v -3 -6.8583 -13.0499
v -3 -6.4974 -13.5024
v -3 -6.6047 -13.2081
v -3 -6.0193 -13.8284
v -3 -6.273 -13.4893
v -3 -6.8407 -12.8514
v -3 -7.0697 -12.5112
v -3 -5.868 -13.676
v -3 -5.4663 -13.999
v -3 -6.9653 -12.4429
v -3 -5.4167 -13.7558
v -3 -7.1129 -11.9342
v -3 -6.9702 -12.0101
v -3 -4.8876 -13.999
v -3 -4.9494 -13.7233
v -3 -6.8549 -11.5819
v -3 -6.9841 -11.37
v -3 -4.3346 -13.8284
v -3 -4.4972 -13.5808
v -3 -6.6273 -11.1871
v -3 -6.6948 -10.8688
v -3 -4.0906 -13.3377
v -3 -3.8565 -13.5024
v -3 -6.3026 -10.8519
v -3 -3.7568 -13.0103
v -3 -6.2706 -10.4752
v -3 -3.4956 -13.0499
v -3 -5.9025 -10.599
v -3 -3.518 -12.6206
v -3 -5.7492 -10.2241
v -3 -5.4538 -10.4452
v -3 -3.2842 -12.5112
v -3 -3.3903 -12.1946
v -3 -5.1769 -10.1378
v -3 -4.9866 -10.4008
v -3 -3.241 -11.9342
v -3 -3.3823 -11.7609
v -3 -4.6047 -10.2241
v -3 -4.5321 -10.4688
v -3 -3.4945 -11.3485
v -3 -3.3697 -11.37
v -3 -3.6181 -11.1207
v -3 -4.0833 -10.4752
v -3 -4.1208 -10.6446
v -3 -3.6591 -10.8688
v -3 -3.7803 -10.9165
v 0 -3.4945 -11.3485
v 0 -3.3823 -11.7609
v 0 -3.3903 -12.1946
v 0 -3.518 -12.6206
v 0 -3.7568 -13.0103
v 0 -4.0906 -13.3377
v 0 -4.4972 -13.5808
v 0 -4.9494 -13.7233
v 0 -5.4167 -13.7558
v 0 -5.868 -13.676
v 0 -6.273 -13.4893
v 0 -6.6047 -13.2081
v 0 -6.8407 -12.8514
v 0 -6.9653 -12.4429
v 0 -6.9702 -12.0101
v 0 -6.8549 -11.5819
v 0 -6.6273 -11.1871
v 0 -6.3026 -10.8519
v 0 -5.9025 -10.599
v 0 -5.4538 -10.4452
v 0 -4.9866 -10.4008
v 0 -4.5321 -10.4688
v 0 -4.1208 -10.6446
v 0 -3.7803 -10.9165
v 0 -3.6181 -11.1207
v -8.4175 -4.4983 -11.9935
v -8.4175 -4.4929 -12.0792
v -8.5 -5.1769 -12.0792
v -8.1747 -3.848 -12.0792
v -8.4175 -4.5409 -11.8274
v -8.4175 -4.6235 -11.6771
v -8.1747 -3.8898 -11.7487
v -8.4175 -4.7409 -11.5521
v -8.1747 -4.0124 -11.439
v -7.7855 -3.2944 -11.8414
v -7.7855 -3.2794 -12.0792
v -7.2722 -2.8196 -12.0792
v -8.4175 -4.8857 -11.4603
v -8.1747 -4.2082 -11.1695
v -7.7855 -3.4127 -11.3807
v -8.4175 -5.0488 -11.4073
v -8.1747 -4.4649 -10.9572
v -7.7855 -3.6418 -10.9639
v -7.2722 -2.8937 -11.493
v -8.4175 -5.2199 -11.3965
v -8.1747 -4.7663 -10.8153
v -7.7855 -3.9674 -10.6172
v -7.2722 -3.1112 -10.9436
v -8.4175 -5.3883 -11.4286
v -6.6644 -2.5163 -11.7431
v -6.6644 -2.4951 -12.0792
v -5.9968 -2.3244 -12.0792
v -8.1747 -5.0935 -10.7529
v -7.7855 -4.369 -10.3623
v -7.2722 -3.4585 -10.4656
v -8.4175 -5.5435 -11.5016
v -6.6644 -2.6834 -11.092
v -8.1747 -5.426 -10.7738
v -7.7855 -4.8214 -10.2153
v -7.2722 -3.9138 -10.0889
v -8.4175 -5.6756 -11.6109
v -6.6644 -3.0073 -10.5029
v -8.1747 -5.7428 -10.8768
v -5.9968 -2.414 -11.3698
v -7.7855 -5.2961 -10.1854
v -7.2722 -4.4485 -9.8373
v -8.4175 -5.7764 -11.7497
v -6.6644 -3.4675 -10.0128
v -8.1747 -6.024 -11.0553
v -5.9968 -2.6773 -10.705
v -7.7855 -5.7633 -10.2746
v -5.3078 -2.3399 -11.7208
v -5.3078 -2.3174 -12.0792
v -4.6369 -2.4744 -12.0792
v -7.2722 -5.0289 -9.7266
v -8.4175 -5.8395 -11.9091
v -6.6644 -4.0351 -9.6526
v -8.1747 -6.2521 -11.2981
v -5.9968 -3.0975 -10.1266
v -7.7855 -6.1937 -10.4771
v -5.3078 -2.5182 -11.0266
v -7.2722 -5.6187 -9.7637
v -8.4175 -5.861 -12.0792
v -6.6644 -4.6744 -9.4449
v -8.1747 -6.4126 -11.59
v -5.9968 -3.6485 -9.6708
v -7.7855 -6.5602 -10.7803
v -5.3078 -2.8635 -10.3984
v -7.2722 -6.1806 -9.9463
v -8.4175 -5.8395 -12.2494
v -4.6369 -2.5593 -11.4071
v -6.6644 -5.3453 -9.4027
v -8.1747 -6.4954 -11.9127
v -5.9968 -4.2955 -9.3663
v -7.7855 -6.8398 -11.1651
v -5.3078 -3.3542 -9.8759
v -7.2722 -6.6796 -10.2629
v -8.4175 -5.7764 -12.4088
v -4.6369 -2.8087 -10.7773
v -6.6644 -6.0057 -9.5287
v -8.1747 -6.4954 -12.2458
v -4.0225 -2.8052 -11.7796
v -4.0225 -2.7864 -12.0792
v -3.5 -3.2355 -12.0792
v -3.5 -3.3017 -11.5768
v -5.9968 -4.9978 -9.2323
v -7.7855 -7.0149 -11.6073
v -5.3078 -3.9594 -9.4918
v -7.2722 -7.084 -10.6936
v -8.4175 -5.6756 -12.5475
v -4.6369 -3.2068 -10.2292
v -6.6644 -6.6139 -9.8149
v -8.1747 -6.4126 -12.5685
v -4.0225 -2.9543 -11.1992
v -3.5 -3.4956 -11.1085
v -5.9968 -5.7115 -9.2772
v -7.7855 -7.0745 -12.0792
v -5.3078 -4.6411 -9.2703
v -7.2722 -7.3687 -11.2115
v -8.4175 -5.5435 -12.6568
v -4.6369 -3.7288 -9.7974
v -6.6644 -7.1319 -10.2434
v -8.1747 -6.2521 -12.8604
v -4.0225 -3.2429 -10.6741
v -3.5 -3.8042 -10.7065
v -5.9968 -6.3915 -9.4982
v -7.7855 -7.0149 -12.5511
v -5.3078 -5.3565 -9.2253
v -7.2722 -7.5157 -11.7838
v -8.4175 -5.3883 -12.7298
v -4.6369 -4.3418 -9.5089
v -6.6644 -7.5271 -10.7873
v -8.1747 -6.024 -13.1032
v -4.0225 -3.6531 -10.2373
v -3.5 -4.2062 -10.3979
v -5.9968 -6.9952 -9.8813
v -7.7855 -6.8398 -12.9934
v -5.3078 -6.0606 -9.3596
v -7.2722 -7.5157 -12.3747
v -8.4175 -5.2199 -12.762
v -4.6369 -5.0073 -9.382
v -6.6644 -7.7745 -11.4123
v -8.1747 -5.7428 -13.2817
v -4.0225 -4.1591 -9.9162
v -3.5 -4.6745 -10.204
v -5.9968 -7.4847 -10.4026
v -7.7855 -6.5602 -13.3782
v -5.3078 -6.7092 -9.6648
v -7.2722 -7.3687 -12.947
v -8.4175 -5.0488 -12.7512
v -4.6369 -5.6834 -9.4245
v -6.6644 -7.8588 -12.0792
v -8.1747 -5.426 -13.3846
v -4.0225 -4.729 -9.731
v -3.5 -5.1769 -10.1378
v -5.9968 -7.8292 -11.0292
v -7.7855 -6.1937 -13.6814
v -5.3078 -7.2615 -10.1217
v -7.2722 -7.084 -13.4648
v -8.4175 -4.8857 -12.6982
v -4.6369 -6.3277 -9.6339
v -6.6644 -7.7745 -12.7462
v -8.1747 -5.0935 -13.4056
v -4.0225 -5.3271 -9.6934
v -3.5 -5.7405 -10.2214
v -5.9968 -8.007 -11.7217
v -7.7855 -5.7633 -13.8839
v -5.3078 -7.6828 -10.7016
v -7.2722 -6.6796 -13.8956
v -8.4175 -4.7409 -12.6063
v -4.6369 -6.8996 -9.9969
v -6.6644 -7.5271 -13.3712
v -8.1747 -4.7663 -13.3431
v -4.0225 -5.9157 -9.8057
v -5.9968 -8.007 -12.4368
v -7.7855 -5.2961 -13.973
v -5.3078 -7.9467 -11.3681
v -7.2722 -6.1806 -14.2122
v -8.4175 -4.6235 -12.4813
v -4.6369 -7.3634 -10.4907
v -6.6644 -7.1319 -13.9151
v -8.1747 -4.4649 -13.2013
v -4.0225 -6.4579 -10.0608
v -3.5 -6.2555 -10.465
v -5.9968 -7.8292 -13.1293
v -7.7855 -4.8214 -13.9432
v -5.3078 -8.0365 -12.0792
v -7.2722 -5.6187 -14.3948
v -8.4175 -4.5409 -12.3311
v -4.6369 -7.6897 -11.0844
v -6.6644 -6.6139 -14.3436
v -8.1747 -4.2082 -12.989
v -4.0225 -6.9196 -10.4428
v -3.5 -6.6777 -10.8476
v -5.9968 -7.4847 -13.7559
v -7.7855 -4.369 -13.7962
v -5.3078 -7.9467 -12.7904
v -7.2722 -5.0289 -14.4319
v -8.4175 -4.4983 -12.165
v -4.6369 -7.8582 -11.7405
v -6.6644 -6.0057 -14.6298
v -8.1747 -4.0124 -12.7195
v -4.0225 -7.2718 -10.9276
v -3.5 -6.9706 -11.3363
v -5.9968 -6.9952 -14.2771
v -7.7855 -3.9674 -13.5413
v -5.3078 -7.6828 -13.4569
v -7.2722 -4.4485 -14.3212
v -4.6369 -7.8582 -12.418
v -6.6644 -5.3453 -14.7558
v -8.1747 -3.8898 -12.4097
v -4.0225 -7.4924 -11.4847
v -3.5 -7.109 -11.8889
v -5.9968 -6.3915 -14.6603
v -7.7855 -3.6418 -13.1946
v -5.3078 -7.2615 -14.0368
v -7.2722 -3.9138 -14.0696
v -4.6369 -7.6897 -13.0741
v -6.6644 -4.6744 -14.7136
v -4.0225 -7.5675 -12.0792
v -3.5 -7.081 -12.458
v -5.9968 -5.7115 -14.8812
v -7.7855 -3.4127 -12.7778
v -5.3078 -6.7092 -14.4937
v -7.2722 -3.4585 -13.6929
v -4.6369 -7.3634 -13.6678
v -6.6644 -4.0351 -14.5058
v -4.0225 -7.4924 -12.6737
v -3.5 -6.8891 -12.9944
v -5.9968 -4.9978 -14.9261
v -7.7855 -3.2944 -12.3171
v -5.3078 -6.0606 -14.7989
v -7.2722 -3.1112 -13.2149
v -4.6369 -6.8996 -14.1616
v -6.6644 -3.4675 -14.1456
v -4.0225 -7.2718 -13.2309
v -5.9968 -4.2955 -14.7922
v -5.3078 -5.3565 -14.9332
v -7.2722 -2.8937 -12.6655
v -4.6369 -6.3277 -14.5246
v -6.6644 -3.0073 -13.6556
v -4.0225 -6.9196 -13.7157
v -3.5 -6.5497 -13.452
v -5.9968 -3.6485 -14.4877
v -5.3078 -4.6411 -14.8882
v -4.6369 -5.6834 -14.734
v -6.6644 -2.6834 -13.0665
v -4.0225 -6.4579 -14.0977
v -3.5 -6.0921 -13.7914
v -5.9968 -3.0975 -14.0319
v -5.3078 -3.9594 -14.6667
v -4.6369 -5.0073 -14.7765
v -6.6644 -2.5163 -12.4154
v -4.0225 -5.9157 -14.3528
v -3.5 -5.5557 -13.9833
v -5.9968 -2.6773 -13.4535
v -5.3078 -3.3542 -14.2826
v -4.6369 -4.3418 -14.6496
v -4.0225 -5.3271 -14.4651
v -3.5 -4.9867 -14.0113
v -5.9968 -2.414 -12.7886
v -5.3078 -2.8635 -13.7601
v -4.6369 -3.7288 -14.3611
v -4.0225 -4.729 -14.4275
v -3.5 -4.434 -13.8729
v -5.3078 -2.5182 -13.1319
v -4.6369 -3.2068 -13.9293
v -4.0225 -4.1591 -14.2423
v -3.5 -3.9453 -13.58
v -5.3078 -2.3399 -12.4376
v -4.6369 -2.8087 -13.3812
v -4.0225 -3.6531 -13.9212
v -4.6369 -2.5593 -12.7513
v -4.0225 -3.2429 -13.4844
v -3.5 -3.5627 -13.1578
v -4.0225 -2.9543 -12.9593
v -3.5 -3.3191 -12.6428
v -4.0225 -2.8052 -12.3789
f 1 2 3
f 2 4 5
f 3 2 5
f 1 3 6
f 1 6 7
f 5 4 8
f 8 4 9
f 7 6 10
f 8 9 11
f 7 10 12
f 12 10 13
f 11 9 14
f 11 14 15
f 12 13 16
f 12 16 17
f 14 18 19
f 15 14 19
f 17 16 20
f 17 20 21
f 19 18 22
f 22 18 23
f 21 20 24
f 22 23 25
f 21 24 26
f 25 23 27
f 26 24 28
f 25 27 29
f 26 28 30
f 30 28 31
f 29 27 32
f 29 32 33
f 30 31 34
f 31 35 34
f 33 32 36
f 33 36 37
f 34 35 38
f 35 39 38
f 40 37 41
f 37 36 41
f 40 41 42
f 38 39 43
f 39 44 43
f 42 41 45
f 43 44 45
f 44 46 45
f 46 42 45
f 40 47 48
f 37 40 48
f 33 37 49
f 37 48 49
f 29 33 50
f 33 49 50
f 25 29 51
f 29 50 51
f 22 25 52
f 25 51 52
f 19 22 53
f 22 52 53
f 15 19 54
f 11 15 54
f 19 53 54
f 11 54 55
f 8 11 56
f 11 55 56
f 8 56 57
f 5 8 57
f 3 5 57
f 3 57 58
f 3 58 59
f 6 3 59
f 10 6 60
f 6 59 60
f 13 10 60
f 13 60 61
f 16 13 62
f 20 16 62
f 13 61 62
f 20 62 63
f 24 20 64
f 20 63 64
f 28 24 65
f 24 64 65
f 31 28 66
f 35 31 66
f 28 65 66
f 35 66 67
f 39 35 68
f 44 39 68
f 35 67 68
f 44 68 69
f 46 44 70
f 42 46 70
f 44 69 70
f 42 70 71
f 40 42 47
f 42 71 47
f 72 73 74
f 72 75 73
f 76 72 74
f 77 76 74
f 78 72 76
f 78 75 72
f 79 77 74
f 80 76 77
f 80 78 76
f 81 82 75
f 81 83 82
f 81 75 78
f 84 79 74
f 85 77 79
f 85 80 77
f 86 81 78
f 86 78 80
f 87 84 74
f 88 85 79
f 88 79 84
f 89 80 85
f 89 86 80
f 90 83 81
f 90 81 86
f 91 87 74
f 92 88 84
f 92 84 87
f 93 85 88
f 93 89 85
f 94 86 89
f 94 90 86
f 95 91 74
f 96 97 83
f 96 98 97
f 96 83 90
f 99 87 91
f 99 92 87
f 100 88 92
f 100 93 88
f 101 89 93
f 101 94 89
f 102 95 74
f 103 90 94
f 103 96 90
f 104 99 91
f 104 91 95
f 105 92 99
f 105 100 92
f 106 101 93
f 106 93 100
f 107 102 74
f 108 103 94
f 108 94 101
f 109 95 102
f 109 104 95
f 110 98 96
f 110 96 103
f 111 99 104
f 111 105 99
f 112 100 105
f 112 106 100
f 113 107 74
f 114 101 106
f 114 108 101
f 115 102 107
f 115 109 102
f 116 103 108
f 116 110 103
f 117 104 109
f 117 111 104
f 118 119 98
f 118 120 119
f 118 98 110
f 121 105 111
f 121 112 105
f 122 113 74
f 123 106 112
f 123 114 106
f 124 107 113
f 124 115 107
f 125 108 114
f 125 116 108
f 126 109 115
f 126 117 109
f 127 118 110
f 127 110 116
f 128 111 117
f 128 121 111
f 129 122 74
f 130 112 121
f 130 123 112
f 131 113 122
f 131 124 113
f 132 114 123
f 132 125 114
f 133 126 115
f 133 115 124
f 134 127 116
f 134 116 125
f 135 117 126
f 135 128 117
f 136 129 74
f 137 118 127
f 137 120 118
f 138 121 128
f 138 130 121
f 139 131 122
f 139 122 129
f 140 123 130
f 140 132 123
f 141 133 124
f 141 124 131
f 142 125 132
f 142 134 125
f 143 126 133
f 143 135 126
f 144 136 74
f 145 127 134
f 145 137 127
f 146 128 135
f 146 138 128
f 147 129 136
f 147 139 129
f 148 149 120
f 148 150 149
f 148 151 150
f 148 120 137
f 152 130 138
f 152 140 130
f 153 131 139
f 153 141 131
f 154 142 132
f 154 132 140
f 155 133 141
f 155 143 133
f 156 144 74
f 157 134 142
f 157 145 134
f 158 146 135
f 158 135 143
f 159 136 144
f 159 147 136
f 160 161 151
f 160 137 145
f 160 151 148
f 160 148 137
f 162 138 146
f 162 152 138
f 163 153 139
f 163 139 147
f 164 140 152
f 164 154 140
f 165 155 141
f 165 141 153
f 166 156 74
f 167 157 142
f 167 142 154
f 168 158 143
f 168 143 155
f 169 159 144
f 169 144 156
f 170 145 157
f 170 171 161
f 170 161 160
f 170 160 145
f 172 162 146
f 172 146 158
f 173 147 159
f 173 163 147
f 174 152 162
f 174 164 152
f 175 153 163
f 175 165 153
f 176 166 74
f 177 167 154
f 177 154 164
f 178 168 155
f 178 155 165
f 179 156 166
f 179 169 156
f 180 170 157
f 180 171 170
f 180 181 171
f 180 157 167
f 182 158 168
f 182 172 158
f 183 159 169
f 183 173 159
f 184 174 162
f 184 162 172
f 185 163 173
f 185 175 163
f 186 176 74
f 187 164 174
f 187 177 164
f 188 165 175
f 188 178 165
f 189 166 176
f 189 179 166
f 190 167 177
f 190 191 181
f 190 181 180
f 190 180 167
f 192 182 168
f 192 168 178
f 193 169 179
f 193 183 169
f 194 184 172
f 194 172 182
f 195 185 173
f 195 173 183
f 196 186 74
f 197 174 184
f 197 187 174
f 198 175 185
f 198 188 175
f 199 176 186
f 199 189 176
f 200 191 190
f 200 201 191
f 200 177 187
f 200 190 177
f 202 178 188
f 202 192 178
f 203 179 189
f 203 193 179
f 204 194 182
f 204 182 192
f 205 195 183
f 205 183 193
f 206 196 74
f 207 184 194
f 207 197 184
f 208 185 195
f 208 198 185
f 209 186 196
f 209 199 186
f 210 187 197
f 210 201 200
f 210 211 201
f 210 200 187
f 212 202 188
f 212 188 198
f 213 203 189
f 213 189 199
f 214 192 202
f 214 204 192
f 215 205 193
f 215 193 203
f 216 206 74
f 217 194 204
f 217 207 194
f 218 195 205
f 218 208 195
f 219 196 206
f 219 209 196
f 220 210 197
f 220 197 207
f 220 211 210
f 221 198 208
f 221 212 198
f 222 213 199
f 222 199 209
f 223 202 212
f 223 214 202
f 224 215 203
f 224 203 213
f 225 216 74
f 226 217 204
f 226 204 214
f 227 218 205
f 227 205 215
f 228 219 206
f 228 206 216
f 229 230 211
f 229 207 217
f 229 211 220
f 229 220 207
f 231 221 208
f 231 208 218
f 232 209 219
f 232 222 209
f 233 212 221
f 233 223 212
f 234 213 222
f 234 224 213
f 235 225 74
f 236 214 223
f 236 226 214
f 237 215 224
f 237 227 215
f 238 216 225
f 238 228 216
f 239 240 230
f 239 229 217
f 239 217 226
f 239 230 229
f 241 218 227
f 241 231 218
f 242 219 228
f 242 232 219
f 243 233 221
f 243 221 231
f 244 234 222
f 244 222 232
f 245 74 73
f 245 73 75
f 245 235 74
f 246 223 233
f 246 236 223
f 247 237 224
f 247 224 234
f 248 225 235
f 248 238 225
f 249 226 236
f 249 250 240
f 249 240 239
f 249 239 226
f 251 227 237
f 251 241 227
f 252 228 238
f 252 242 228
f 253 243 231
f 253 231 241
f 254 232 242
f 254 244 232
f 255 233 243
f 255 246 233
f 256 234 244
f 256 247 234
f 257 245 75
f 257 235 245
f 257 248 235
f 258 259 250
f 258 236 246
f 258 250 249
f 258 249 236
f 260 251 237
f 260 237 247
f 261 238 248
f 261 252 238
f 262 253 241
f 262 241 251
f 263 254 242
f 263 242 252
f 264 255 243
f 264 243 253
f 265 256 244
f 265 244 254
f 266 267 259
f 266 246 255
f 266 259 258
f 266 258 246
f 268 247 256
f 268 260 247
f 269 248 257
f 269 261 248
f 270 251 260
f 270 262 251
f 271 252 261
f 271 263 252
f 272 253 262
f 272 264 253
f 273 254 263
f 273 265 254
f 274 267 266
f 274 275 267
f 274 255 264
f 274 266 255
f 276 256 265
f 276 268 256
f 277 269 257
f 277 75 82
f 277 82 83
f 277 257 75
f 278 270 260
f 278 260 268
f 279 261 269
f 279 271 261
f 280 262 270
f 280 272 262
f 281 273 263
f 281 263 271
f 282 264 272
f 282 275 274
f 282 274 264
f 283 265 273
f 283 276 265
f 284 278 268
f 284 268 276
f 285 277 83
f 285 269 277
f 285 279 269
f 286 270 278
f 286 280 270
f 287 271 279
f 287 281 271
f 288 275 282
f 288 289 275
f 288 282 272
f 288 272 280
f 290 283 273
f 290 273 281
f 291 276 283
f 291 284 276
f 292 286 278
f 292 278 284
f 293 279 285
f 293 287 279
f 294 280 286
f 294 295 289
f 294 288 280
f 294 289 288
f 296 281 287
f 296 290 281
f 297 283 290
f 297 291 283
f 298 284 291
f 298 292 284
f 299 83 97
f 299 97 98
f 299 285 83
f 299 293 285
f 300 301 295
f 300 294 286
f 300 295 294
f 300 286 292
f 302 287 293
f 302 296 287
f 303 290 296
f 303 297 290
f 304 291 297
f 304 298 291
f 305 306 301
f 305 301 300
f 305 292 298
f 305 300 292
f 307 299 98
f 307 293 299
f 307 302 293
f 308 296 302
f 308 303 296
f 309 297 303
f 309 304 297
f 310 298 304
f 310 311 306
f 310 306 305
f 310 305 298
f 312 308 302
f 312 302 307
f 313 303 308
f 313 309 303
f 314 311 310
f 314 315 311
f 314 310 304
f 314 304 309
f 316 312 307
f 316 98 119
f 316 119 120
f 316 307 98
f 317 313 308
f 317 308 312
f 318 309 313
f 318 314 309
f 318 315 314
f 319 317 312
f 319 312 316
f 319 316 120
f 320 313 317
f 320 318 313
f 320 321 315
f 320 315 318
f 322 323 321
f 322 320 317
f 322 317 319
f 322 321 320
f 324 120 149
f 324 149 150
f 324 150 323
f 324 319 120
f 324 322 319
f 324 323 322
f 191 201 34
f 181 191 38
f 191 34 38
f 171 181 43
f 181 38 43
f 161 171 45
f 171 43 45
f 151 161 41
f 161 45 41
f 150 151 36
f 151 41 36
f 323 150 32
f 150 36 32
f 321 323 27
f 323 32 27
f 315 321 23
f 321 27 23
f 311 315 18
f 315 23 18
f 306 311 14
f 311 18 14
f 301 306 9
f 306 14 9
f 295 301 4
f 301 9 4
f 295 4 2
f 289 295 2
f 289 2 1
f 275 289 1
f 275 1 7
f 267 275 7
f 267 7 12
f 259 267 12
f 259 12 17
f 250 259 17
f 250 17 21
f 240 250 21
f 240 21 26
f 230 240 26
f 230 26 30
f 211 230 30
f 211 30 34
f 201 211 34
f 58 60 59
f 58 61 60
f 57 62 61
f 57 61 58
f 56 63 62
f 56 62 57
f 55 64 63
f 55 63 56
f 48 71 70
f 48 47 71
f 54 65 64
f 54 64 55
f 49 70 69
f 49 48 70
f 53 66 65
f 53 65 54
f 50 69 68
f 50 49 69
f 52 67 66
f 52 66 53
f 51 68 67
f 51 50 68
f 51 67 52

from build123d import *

# Parameters (mm, degrees)
BOSS_EXTRUDE1_DEPTH = 4
CUT_EXTRUDE3_START  = -10
CUT_EXTRUDE3_DEPTH  = 10
CUT_EXTRUDE4_DEPTH  = 10
FILLET4_START       = -1
FILLET4_DEPTH       = 6
SKETCH7_RX          = 1.83432271
SKETCH7_RY          = 1.648181576
BOSS_EXTRUDE2_DEPTH = 3
SKETCH8_R           = 1.941403724
BOSS_EXTRUDE3_DEPTH = 0.5
CUT_EXTRUDE5_DEPTH  = 5
CUT_EXTRUDE6_DEPTH  = 10


with BuildPart() as part:
    # Sketch1 → Boss-Extrude1 (new body)
    with BuildSketch(Plane(origin=(0, 0, 0), x_dir=(0, 0, -1), z_dir=(1, 0, 0))):
        with BuildLine():
            Line((6.442518848, 0), (13.409619329, 0))
            ThreePointArc((13.409619329, 0), (16.945153235, -1.464466094), (18.409619329, -5))
            Line((18.409619329, -5), (18.409619329, -20.34540211))
            ThreePointArc((18.409619329, -20.34540211), (16.945153235, -23.880936016), (13.409619329, -25.34540211))
            Line((13.409619329, -25.34540211), (6.442518848, -25.34540211))
            ThreePointArc((6.442518848, -25.34540211), (2.906984942, -23.880936016), (1.442518848, -20.34540211))
            Line((1.442518848, -20.34540211), (1.442518848, -5))
            ThreePointArc((1.442518848, -5), (2.906984942, -1.464466094), (6.442518848, 0))
        make_face()
    extrude(amount=BOSS_EXTRUDE1_DEPTH)

    # Sketch2 → Cut-Extrude3 (cut)
    with BuildSketch(Plane(origin=(4, 0, 0), x_dir=(0, 0, -1), z_dir=(1, 0, 0)).offset(CUT_EXTRUDE3_START)):
        with BuildLine():
            add(Edge.make_bspline(
                [(2.42884403, -23.286077848), (2.370716158, -22.573896831), (4.185530255, -21.12926271), (4.874517164, -17.962112227), (7.118988975, -13.802662727), (6.544049448, -7.530329658), (1.569055746, -5.349803368), (1.58046752, -3.833613753)],
                knots=[0.531334438, 0.531334438, 0.531334438, 0.531334438, 0.570400737, 0.608236932, 0.680812242, 0.778589658, 0.857107486, 0.857107486, 0.857107486, 0.857107486], degree=3))
            ThreePointArc((1.58046752, -3.833613753), (1.47712578, -4.412742239), (1.442518848, -5))
            Line((1.442518848, -5), (1.442518848, -20.34540211))
            ThreePointArc((1.442518848, -20.34540211), (1.683757797, -21.87974016), (2.384196149, -23.266021372))
            add(Edge.make_bspline(
                [(2.384196149, -23.266021372), (2.399070873, -23.272759012), (2.413953527, -23.279444568), (2.428844038, -23.286077844)],
                knots=[0.998981394, 0.998981394, 0.998981394, 0.998981394, 0.999513034, 0.999513034, 0.999513034, 0.999513034], degree=3))
        make_face()
        with BuildLine():
            Line((13.409619329, 0), (9.46398266, 0))
            add(Edge.make_bspline(
                [(9.46398266, 0), (11.207503001, -0.168664697), (14.40943711, -0.885845558), (18.093070912, -5.600973008), (14.034927819, -11.50687924), (8.23474836, -15.211494887), (7.662204752, -25.591568315), (4.542739971, -24.937885151)],
                knots=[0, 0, 0, 0, 0.077946221, 0.143334379, 0.228662798, 0.345497184, 0.490655992, 0.490655992, 0.490655992, 0.490655992], degree=3))
            add(Edge.make_bspline(
                [(4.54273997, -24.937885153), (5.749127141, -25.532851997), (7.208451258, -25.09277451), (8.521498661, -25.334156754), (8.57622256, -25.34540211)],
                knots=[0.001400322, 0.001400322, 0.001400322, 0.001400322, 0.038459748, 0.040079073, 0.040079073, 0.040079073, 0.040079073], degree=3))
            Line((8.57622256, -25.34540211), (13.409619329, -25.34540211))
            ThreePointArc((13.409619329, -25.34540211), (16.945153235, -23.880936016), (18.409619329, -20.34540211))
            Line((18.409619329, -20.34540211), (18.409619329, -5))
            ThreePointArc((18.409619329, -5), (16.945153235, -1.464466094), (13.409619329, 0))
        make_face()
        with BuildLine():
            ThreePointArc((2.906984942, -1.464466094), (4.529101686, -0.380602337), (6.442518848, 0))
            add(Edge.make_bspline(
                [(6.442518848, 0), (7.443592251, 0.121124965), (8.454170968, 0.097687179), (9.46398266, 0)],
                knots=[0.954855127, 0.954855127, 0.954855127, 0.954855127, 1, 1, 1, 1], degree=3))
            Line((9.46398266, 0), (13.409619329, 0))
            ThreePointArc((13.409619329, 0), (16.945153235, -1.464466094), (18.409619329, -5))
            Line((18.409619329, -5), (18.409619329, -20.34540211))
            ThreePointArc((18.409619329, -20.34540211), (16.945153235, -23.880936016), (13.409619329, -25.34540211))
            Line((13.409619329, -25.34540211), (8.57622256, -25.34540211))
            add(Edge.make_bspline(
                [(8.57622256, -25.34540211), (10.509849295, -25.742748085), (21.004932545, -37.507061135), (40.108036136, 7.046689321), (11.067178354, 5.045725954), (-13.182357735, 4.105959789), (-4.736766595, -20.04051671), (2.384196149, -23.266021372)],
                knots=[0.040079073, 0.040079073, 0.040079073, 0.040079073, 0.09729665, 0.409886449, 0.593670055, 0.744469586, 0.998981394, 0.998981394, 0.998981394, 0.998981394], degree=3))
            ThreePointArc((2.384196149, -23.266021372), (1.683757797, -21.87974016), (1.442518848, -20.34540211))
            Line((1.442518848, -20.34540211), (1.442518848, -5))
            ThreePointArc((1.442518848, -5), (1.47712578, -4.412742239), (1.58046752, -3.833613753))
            add(Edge.make_bspline(
                [(1.58046752, -3.833613753), (1.586363874, -3.050213083), (2.186842654, -2.121305338), (2.906984942, -1.464466094)],
                knots=[0.857107486, 0.857107486, 0.857107486, 0.857107486, 0.897676897, 0.897676897, 0.897676897, 0.897676897], degree=3))
        make_face()
    extrude(amount=CUT_EXTRUDE3_DEPTH, mode=Mode.SUBTRACT)

    # Sketch6 → Cut-Extrude4 (cut)
    with BuildSketch(Plane(origin=(4, 0, 0), x_dir=(0, 0, -1), z_dir=(1, 0, 0))):
        with BuildLine():
            add(Edge.make_bspline(
                [(6.876629539, -24.646378986), (6.348652857, -24.697603605), (5.705170416, -25.181041107), (2.967179599, -24.643973727), (6.798679283, -26.524715176), (10.198220508, -25.437781208), (7.742791771, -24.562343399), (6.876629539, -24.646378986)],
                knots=[0, 0, 0, 0, 0.142115473, 0.262842986, 0.576183637, 0.76685513, 1, 1, 1, 1], degree=3))
        make_face()
    extrude(amount=-CUT_EXTRUDE4_DEPTH, mode=Mode.SUBTRACT)

    # Fillet4: read off the stored shape, not the designer's step
    # Fillet4 outline → Fillet4 (cut)
    with BuildSketch(Plane.YZ.offset(FILLET4_START)):
        with BuildLine():
            ThreePointArc((0, -8.890200058), (-0.027061887, -9.625390775), (-0.108101078, -10.356602363))
            add(Edge.make_bspline(
                [(0, -9.46398266), (-0.028832047, -9.762025236), (-0.064132076, -10.060000995), (-0.108101078, -10.356602363)],
                knots=[0, 0, 0, 0, 0.01332436, 0.01332436, 0.01332436, 0.01332436], degree=3))
            Line((0, -9.46398266), (0, -8.890200058))
        make_face()
    extrude(amount=FILLET4_DEPTH, mode=Mode.SUBTRACT)

    # Sketch7 → Boss-Extrude2 (add)
    with BuildSketch(Plane.ZY):
        with Locations(Location((-12.079238976, -5.176946967), (0, 0, 66.52385958))):
            Ellipse(SKETCH7_RX, SKETCH7_RY)
    extrude(amount=BOSS_EXTRUDE2_DEPTH)

    # Sketch8 → Boss-Extrude3 (add)
    with BuildSketch(Plane.ZY.offset(3)):
        with Locations((-12.079238976, -5.176946967)):
            Circle(SKETCH8_R)
    extrude(amount=BOSS_EXTRUDE3_DEPTH)

    # Dome1: read off the stored shape, not the designer's step
    # Dome1 outline → Dome1 (revolve)
    with BuildSketch(Plane(origin=(0, -5.176946967, -12.079238976), x_dir=(0, 1, 0), z_dir=(0, 0, -1))):
        with BuildLine():
            Line((0, -3.499999998), (0, -8.5))
            ThreePointArc((0, -8.5), (2.681839314, -6.664401723), (1.941403723, -3.499999999))
            Line((1.941403723, -3.499999999), (0, -3.499999998))
        make_face()
    revolve(axis=Axis((0, -5.176946967, -12.079238976), (1, 0, 0)))

    # Sketch9 → Cut-Extrude5 (cut)
    with BuildSketch(Plane.ZY):
        with BuildLine():
            Line((-4.325838527, -20.140987675), (-2.486204677, -24.505449301))
            add(Edge.make_bspline(
                [(-2.486204677, -24.505449301), (3.73593799, -24.171685926), (-2.121854058, -16.126748366), (-4.325838527, -20.140987675)],
                knots=[0, 0, 0, 0, 1, 1, 1, 1], degree=3))
        make_face()
    extrude(amount=-CUT_EXTRUDE5_DEPTH, mode=Mode.SUBTRACT)

    # Sketch10 → Cut-Extrude6 (cut)
    with BuildSketch(Plane.ZY):
        with BuildLine():
            add(Edge.make_bspline(
                [(-20.598699556, -6.394321891), (-16.755827274, 0.910133144), (9.164509457, 10.912523184), (-0.036389797, -25.461480915), (-14.467778879, -53.72221039), (-27.813040504, -20.107197366), (-20.598699556, -6.394321891)],
                knots=[0, 0, 0, 0, 0.192062033, 0.555519923, 0.639436107, 1, 1, 1, 1], degree=3))
        make_face()
    extrude(amount=-CUT_EXTRUDE6_DEPTH, mode=Mode.SUBTRACT)


solid = part.part
